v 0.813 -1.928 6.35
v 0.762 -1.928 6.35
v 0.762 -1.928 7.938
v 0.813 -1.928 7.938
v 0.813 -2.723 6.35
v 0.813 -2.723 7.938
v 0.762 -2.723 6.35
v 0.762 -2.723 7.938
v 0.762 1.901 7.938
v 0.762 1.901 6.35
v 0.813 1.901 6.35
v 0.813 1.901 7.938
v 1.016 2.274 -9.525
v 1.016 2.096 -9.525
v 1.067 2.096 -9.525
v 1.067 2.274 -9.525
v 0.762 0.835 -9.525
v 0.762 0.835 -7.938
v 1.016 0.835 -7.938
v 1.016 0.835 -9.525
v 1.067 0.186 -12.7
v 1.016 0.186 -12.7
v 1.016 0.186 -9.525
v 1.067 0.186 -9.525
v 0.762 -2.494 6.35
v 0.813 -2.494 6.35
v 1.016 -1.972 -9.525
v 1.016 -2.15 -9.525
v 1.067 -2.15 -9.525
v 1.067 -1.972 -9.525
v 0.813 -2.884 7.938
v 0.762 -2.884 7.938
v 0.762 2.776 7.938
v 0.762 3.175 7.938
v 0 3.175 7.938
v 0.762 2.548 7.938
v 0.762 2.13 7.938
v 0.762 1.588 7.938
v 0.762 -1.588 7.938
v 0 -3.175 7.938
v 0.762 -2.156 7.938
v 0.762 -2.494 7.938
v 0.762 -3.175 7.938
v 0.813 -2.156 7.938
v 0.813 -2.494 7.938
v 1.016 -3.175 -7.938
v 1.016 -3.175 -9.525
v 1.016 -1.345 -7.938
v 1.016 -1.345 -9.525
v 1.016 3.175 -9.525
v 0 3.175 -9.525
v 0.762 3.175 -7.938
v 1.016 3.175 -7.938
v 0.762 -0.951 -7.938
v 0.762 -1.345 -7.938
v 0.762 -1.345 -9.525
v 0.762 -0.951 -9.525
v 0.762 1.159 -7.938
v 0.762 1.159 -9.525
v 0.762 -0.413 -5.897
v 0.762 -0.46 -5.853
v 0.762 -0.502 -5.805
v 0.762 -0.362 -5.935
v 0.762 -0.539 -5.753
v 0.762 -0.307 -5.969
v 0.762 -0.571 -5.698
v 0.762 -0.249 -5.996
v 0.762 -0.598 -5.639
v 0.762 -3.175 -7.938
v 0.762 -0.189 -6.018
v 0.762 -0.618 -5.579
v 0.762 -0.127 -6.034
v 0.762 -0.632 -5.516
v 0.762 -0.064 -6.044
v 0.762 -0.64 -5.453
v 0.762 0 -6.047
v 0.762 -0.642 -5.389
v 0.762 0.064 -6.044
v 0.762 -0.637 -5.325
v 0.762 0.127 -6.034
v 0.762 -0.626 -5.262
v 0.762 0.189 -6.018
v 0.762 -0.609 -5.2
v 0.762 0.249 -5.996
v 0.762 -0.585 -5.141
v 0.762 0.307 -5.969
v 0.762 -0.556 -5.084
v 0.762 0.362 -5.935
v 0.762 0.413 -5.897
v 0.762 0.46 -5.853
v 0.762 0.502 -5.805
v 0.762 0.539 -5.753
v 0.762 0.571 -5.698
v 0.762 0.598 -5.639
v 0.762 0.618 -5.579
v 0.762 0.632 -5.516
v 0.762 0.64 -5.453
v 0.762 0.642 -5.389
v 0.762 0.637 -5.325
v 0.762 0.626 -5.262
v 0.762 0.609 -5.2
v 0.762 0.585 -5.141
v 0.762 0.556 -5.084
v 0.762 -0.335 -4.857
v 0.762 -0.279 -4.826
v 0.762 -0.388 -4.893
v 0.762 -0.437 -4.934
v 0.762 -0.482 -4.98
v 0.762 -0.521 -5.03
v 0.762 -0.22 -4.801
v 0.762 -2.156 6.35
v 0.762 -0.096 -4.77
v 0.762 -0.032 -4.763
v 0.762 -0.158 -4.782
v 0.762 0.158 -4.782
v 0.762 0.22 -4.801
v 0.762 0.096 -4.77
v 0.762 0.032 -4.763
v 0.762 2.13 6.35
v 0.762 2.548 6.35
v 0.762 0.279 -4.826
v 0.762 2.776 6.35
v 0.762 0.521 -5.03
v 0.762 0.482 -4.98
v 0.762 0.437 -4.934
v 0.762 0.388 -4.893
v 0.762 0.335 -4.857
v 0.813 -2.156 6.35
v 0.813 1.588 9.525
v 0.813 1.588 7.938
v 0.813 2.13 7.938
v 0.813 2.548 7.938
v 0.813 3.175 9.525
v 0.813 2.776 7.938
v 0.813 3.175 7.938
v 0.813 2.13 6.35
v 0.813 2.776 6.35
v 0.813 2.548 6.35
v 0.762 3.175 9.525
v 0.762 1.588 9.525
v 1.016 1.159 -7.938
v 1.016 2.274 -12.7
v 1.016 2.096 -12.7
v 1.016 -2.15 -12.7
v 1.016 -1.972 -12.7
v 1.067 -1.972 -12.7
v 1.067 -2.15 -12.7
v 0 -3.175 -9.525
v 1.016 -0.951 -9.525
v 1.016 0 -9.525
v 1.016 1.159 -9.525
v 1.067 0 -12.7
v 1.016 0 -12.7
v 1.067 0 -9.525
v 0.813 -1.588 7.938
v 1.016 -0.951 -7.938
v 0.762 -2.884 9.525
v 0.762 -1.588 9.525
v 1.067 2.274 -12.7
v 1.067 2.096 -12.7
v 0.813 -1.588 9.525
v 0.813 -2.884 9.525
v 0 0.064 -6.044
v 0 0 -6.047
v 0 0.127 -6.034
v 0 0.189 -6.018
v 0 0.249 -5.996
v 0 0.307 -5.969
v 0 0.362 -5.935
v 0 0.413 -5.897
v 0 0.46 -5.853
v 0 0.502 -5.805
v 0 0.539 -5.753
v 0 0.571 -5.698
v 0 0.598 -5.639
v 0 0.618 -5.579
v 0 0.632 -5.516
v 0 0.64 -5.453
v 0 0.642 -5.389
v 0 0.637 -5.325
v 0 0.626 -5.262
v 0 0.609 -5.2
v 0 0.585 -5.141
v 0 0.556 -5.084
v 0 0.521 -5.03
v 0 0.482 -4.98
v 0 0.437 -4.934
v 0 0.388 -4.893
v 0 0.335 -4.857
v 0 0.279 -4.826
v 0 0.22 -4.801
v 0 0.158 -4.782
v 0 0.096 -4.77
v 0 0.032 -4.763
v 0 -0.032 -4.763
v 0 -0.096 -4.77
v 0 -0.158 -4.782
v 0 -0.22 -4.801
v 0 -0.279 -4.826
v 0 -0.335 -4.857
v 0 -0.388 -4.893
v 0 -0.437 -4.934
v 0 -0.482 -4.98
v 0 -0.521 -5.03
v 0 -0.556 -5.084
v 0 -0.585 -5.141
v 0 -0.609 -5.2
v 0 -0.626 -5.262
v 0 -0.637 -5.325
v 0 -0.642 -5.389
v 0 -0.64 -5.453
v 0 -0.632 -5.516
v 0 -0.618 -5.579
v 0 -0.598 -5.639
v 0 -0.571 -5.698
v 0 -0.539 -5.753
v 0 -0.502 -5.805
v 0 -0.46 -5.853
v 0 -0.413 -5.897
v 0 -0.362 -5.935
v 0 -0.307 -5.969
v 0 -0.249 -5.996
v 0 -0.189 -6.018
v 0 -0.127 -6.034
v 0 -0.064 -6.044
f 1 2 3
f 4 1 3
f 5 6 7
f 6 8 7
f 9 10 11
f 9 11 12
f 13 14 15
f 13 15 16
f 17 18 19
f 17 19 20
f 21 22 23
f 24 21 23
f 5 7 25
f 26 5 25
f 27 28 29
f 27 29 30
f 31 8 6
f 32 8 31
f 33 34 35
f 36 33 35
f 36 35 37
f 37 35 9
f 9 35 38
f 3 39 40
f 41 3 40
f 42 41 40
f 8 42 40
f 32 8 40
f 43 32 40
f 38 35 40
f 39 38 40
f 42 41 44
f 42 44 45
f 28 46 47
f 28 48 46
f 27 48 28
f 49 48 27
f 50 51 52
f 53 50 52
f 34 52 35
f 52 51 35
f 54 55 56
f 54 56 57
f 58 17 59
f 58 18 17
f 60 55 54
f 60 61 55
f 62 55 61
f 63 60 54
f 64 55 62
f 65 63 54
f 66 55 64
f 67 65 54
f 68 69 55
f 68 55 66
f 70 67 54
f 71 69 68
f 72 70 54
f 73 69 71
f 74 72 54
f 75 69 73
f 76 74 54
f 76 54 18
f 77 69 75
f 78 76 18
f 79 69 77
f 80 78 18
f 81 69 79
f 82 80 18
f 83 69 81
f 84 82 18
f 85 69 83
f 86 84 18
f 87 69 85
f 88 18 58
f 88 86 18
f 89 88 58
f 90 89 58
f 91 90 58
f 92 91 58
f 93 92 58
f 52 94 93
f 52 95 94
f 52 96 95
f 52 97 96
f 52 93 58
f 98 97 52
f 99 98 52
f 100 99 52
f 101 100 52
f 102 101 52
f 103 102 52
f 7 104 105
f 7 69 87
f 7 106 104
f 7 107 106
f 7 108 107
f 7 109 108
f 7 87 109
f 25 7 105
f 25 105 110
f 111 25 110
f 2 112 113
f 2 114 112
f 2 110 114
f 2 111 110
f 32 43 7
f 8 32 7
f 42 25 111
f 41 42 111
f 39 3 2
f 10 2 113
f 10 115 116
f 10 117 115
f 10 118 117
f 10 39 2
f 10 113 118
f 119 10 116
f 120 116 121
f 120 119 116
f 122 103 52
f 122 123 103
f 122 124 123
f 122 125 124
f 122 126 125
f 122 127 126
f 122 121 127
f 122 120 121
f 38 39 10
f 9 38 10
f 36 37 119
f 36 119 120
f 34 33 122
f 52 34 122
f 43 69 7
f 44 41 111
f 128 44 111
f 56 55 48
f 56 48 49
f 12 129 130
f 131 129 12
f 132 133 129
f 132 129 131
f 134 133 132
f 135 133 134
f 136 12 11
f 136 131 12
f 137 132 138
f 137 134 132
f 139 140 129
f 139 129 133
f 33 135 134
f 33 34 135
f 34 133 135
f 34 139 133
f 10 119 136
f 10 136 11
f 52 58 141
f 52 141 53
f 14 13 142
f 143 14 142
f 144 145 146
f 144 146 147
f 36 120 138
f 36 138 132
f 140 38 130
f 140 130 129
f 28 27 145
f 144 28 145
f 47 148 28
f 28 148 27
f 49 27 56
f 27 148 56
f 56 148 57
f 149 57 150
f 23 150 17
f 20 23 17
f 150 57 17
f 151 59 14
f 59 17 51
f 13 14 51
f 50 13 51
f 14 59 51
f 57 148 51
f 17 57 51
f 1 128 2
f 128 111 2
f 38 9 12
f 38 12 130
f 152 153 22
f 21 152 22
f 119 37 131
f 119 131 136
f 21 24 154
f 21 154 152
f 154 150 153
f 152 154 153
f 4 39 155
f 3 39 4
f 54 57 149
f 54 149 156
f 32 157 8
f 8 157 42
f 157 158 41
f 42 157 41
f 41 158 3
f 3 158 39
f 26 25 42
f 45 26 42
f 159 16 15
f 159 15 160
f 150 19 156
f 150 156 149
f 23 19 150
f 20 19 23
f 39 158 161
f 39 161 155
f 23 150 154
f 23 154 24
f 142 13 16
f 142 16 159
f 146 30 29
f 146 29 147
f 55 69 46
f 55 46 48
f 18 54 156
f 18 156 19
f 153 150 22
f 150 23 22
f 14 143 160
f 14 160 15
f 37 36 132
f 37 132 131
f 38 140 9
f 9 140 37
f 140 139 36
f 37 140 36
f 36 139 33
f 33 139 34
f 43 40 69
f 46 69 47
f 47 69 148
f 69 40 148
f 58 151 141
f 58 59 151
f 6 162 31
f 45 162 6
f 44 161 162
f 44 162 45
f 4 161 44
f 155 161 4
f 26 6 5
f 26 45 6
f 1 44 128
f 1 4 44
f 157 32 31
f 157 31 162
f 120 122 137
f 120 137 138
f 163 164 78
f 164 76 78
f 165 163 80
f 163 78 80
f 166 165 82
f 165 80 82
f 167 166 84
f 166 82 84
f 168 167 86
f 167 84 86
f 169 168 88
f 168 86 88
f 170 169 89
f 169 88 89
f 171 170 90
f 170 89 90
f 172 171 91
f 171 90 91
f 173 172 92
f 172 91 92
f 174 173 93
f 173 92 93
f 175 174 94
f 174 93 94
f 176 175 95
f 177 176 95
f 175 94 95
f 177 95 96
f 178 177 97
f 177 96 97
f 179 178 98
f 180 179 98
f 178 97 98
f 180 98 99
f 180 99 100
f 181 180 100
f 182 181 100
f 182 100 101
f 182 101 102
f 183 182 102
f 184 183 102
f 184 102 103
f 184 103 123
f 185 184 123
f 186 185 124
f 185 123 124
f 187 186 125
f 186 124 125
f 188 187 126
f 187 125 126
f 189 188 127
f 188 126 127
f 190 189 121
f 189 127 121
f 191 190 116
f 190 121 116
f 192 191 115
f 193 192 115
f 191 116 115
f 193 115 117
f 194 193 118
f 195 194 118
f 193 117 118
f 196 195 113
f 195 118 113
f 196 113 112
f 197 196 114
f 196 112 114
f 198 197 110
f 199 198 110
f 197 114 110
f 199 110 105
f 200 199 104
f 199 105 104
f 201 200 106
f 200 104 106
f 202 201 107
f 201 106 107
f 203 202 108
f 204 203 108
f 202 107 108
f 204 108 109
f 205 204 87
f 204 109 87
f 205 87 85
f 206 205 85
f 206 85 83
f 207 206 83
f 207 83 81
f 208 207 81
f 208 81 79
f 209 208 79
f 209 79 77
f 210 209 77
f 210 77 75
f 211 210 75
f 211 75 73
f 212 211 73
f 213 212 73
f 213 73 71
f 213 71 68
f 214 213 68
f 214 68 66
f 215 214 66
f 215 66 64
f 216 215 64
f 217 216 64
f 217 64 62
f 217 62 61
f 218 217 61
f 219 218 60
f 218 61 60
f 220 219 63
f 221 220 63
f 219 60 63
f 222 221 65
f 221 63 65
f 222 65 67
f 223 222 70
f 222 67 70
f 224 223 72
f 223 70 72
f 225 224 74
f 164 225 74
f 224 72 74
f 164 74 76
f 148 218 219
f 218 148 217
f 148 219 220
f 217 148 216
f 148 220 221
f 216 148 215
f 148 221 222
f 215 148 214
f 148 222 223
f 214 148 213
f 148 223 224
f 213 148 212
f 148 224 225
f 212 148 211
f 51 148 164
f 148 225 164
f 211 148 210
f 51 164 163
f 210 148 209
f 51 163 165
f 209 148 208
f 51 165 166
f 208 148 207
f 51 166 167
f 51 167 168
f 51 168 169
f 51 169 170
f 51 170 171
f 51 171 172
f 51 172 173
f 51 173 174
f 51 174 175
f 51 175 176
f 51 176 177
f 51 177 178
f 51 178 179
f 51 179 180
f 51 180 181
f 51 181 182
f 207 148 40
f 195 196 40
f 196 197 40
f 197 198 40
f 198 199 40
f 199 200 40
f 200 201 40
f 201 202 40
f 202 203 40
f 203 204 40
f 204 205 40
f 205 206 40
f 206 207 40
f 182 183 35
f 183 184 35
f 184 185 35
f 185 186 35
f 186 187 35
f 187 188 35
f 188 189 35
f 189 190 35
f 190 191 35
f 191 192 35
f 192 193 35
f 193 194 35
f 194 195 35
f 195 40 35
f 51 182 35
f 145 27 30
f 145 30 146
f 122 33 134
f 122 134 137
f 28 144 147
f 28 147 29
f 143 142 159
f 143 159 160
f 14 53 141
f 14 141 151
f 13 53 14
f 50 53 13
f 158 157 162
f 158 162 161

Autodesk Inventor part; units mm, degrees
ref_plane "YZ Plane" through (0, 0, 0) normal (1, 0, 0) x (0, 1, 0)
ref_plane "XZ Plane" through (0, 0, 0) normal (0, 1, 0) x (-1, 0, 0)
ref_plane "XY Plane" through (0, 0, 0) normal (0, 0, 1) x (1, 0, 0)
sketch "Sketch1" plane through (0, 0, 0) normal (1, 0, 0) x (0, 1, 0)
  line L0 (3.175, 7.9375) -> (-3.175, 7.9375)
  line L1 (-3.175, 7.9375) -> (-3.175, -9.525)
  line L2 (-3.175, -9.525) -> (3.175, -9.525)
  line L3 (3.175, -9.525) -> (3.175, 7.9375)
  line L4 (3.175, -8.3415) -> (1.4145, -8.3415)
  line L5 (1.4145, -8.3415) -> (1.4145, -9.525)
  line L6 (1.4145, -9.525) -> (3.175, -9.525)
  line L7 (3.175, -9.525) -> (3.175, -8.3415)
  line L8 (1.113, -8.3415) -> (-0.7652, -8.3415)
  line L9 (-0.7652, -8.3415) -> (-0.7652, -9.525)
  line L10 (-0.7652, -9.525) -> (1.113, -9.525)
  line L11 (1.113, -9.525) -> (1.113, -8.3415)
  line L12 (-1.2985, -8.3415) -> (-3.175, -8.3415)
  line L13 (-3.175, -8.3415) -> (-3.175, -9.525)
  line L14 (-3.175, -9.525) -> (-1.2985, -9.525)
  line L15 (-1.2985, -9.525) -> (-1.2985, -8.3415)
  point P0 (0, 0)
extrude "Extrusion1" add sketch "Sketch1" along normal blind 0.762
sketch "Sketch2" plane through (0.762, 0, 0) normal (1, 0, 0) x (0, 0, -1)
  line L0 (9.525, 3.175) -> (-7.9375, 3.175) projected
  line L1 (9.525, -3.175) -> (9.525, 3.175) projected
  line L2 (7.9375, 3.175) -> (9.525, 3.175)
  line L3 (9.525, 3.175) -> (9.525, 1.1594)
  line L4 (9.525, 1.1594) -> (7.9375, 1.1594)
  line L5 (7.9375, 1.1594) -> (7.9375, 3.175)
  line L6 (7.9375, 0.8348) -> (9.525, 0.8348)
  line L7 (9.525, 0.8348) -> (9.525, -0.9507)
  line L8 (9.525, -0.9507) -> (7.9375, -0.9507)
  line L9 (7.9375, -0.9507) -> (7.9375, 0.8348)
  line L10 (7.9375, -1.3449) -> (9.525, -1.3449)
  line L11 (9.525, -1.3449) -> (9.525, -3.175)
  line L12 (9.525, -3.175) -> (7.9375, -3.175)
  line L13 (7.9375, -3.175) -> (7.9375, -1.3449)
  point P0 (0, 0)
extrude "Extrusion2" add sketch "Sketch2" along normal blind 0.254
sketch "Sketch3" plane through (1.016, 0, 0) normal (1, 0, 0) x (0, 0, -1)
  line L0 (9.525, 2.2739) -> (12.7, 2.2739)
  line L1 (12.7, 2.2739) -> (12.7, 2.0961)
  line L2 (12.7, 2.0961) -> (9.525, 2.0961)
  line L3 (9.525, 2.0961) -> (9.525, 2.2739)
  line L4 (9.525, -3.175) -> (9.525, 3.175) projected
  line L5 (9.525, 0) -> (12.7, 0)
  line L6 (12.7, 0) -> (12.7, 0.1856)
  line L7 (12.7, 0.1856) -> (9.525, 0.1856)
  line L8 (9.525, 0.1856) -> (9.525, 0)
  line L9 (9.525, -1.9723) -> (12.7, -1.9723)
  line L10 (12.7, -1.9723) -> (12.7, -2.1501)
  line L11 (12.7, -2.1501) -> (9.525, -2.1501)
  line L12 (9.525, -2.1501) -> (9.525, -1.9723)
  point P0 (0, 0)
  dimension "d4" = 0.1778
  dimension "d5" = 0.1778
extrude "Extrusion3" add sketch "Sketch3" along normal blind 0.0508
sketch "Sketch4" plane through (0.762, 0, 0) normal (1, 0, 0) x (0, 0, -1)
  circle A0 centre (5.4047, 0) radius 0.6422
  point P0 (0, 0)
extrude "Extrusion4" cut sketch "Sketch4" against normal mid plane 25.4
sketch "Sketch5" plane through (0.762, 0, 0) normal (1, 0, 0) x (0, 0, -1)
  line L0 (-7.9375, 3.175) -> (-7.9375, -3.175) projected
  line L1 (-7.9375, 2.7765) -> (-6.35, 2.7765)
  line L2 (-6.35, 2.7765) -> (-6.35, 2.5479)
  line L3 (-6.35, 2.5479) -> (-7.9375, 2.5479)
  line L4 (-7.9375, 2.5479) -> (-7.9375, 2.7765)
  line L5 (-7.9375, 2.1295) -> (-6.35, 2.1295)
  line L6 (-6.35, 2.1295) -> (-6.35, 1.9009)
  line L7 (-6.35, 1.9009) -> (-7.9375, 1.9009)
  line L8 (-7.9375, 1.9009) -> (-7.9375, 2.1295)
  line L9 (-7.9375, -2.7226) -> (-6.35, -2.7226)
  line L10 (-6.35, -2.7226) -> (-6.35, -2.494)
  line L11 (-6.35, -2.494) -> (-7.9375, -2.494)
  line L12 (-7.9375, -2.494) -> (-7.9375, -2.7226)
  line L13 (-7.9375, -2.1565) -> (-6.35, -2.1565)
  line L14 (-6.35, -2.1565) -> (-6.35, -1.9279)
  line L15 (-6.35, -1.9279) -> (-7.9375, -1.9279)
  line L16 (-7.9375, -1.9279) -> (-7.9375, -2.1565)
  point P0 (0, 0)
  dimension "d10" = 0.2286
  dimension "d11" = 0.2286
  dimension "d12" = 0.2286
  dimension "d13" = 0.2286
extrude "Extrusion5" add sketch "Sketch5" along normal blind 0.0508
sketch "Sketch6" plane through (0.762, 0, 0) normal (1, 0, 0) x (0, 0, -1)
  line L0 (-7.9375, 3.175) -> (-7.9375, -3.175) projected
  line L1 (-7.9375, 1.5875) -> (-9.525, 1.5875)
  line L2 (-9.525, 1.5875) -> (-9.525, 3.175)
  line L3 (-9.525, 3.175) -> (-7.9375, 3.175)
  line L4 (-7.9375, 3.175) -> (-7.9375, 1.5875)
  line L5 (-7.9375, -2.8843) -> (-9.525, -2.8843)
  line L6 (-9.525, -2.8843) -> (-9.525, -1.5875)
  line L7 (-9.525, -1.5875) -> (-7.9375, -1.5875)
  line L8 (-7.9375, -1.5875) -> (-7.9375, -2.8843)
  point P0 (0, 0)
extrude "Extrusion6" add sketch "Sketch6" along normal blind 0.0508
properties part number "SENSOR"
